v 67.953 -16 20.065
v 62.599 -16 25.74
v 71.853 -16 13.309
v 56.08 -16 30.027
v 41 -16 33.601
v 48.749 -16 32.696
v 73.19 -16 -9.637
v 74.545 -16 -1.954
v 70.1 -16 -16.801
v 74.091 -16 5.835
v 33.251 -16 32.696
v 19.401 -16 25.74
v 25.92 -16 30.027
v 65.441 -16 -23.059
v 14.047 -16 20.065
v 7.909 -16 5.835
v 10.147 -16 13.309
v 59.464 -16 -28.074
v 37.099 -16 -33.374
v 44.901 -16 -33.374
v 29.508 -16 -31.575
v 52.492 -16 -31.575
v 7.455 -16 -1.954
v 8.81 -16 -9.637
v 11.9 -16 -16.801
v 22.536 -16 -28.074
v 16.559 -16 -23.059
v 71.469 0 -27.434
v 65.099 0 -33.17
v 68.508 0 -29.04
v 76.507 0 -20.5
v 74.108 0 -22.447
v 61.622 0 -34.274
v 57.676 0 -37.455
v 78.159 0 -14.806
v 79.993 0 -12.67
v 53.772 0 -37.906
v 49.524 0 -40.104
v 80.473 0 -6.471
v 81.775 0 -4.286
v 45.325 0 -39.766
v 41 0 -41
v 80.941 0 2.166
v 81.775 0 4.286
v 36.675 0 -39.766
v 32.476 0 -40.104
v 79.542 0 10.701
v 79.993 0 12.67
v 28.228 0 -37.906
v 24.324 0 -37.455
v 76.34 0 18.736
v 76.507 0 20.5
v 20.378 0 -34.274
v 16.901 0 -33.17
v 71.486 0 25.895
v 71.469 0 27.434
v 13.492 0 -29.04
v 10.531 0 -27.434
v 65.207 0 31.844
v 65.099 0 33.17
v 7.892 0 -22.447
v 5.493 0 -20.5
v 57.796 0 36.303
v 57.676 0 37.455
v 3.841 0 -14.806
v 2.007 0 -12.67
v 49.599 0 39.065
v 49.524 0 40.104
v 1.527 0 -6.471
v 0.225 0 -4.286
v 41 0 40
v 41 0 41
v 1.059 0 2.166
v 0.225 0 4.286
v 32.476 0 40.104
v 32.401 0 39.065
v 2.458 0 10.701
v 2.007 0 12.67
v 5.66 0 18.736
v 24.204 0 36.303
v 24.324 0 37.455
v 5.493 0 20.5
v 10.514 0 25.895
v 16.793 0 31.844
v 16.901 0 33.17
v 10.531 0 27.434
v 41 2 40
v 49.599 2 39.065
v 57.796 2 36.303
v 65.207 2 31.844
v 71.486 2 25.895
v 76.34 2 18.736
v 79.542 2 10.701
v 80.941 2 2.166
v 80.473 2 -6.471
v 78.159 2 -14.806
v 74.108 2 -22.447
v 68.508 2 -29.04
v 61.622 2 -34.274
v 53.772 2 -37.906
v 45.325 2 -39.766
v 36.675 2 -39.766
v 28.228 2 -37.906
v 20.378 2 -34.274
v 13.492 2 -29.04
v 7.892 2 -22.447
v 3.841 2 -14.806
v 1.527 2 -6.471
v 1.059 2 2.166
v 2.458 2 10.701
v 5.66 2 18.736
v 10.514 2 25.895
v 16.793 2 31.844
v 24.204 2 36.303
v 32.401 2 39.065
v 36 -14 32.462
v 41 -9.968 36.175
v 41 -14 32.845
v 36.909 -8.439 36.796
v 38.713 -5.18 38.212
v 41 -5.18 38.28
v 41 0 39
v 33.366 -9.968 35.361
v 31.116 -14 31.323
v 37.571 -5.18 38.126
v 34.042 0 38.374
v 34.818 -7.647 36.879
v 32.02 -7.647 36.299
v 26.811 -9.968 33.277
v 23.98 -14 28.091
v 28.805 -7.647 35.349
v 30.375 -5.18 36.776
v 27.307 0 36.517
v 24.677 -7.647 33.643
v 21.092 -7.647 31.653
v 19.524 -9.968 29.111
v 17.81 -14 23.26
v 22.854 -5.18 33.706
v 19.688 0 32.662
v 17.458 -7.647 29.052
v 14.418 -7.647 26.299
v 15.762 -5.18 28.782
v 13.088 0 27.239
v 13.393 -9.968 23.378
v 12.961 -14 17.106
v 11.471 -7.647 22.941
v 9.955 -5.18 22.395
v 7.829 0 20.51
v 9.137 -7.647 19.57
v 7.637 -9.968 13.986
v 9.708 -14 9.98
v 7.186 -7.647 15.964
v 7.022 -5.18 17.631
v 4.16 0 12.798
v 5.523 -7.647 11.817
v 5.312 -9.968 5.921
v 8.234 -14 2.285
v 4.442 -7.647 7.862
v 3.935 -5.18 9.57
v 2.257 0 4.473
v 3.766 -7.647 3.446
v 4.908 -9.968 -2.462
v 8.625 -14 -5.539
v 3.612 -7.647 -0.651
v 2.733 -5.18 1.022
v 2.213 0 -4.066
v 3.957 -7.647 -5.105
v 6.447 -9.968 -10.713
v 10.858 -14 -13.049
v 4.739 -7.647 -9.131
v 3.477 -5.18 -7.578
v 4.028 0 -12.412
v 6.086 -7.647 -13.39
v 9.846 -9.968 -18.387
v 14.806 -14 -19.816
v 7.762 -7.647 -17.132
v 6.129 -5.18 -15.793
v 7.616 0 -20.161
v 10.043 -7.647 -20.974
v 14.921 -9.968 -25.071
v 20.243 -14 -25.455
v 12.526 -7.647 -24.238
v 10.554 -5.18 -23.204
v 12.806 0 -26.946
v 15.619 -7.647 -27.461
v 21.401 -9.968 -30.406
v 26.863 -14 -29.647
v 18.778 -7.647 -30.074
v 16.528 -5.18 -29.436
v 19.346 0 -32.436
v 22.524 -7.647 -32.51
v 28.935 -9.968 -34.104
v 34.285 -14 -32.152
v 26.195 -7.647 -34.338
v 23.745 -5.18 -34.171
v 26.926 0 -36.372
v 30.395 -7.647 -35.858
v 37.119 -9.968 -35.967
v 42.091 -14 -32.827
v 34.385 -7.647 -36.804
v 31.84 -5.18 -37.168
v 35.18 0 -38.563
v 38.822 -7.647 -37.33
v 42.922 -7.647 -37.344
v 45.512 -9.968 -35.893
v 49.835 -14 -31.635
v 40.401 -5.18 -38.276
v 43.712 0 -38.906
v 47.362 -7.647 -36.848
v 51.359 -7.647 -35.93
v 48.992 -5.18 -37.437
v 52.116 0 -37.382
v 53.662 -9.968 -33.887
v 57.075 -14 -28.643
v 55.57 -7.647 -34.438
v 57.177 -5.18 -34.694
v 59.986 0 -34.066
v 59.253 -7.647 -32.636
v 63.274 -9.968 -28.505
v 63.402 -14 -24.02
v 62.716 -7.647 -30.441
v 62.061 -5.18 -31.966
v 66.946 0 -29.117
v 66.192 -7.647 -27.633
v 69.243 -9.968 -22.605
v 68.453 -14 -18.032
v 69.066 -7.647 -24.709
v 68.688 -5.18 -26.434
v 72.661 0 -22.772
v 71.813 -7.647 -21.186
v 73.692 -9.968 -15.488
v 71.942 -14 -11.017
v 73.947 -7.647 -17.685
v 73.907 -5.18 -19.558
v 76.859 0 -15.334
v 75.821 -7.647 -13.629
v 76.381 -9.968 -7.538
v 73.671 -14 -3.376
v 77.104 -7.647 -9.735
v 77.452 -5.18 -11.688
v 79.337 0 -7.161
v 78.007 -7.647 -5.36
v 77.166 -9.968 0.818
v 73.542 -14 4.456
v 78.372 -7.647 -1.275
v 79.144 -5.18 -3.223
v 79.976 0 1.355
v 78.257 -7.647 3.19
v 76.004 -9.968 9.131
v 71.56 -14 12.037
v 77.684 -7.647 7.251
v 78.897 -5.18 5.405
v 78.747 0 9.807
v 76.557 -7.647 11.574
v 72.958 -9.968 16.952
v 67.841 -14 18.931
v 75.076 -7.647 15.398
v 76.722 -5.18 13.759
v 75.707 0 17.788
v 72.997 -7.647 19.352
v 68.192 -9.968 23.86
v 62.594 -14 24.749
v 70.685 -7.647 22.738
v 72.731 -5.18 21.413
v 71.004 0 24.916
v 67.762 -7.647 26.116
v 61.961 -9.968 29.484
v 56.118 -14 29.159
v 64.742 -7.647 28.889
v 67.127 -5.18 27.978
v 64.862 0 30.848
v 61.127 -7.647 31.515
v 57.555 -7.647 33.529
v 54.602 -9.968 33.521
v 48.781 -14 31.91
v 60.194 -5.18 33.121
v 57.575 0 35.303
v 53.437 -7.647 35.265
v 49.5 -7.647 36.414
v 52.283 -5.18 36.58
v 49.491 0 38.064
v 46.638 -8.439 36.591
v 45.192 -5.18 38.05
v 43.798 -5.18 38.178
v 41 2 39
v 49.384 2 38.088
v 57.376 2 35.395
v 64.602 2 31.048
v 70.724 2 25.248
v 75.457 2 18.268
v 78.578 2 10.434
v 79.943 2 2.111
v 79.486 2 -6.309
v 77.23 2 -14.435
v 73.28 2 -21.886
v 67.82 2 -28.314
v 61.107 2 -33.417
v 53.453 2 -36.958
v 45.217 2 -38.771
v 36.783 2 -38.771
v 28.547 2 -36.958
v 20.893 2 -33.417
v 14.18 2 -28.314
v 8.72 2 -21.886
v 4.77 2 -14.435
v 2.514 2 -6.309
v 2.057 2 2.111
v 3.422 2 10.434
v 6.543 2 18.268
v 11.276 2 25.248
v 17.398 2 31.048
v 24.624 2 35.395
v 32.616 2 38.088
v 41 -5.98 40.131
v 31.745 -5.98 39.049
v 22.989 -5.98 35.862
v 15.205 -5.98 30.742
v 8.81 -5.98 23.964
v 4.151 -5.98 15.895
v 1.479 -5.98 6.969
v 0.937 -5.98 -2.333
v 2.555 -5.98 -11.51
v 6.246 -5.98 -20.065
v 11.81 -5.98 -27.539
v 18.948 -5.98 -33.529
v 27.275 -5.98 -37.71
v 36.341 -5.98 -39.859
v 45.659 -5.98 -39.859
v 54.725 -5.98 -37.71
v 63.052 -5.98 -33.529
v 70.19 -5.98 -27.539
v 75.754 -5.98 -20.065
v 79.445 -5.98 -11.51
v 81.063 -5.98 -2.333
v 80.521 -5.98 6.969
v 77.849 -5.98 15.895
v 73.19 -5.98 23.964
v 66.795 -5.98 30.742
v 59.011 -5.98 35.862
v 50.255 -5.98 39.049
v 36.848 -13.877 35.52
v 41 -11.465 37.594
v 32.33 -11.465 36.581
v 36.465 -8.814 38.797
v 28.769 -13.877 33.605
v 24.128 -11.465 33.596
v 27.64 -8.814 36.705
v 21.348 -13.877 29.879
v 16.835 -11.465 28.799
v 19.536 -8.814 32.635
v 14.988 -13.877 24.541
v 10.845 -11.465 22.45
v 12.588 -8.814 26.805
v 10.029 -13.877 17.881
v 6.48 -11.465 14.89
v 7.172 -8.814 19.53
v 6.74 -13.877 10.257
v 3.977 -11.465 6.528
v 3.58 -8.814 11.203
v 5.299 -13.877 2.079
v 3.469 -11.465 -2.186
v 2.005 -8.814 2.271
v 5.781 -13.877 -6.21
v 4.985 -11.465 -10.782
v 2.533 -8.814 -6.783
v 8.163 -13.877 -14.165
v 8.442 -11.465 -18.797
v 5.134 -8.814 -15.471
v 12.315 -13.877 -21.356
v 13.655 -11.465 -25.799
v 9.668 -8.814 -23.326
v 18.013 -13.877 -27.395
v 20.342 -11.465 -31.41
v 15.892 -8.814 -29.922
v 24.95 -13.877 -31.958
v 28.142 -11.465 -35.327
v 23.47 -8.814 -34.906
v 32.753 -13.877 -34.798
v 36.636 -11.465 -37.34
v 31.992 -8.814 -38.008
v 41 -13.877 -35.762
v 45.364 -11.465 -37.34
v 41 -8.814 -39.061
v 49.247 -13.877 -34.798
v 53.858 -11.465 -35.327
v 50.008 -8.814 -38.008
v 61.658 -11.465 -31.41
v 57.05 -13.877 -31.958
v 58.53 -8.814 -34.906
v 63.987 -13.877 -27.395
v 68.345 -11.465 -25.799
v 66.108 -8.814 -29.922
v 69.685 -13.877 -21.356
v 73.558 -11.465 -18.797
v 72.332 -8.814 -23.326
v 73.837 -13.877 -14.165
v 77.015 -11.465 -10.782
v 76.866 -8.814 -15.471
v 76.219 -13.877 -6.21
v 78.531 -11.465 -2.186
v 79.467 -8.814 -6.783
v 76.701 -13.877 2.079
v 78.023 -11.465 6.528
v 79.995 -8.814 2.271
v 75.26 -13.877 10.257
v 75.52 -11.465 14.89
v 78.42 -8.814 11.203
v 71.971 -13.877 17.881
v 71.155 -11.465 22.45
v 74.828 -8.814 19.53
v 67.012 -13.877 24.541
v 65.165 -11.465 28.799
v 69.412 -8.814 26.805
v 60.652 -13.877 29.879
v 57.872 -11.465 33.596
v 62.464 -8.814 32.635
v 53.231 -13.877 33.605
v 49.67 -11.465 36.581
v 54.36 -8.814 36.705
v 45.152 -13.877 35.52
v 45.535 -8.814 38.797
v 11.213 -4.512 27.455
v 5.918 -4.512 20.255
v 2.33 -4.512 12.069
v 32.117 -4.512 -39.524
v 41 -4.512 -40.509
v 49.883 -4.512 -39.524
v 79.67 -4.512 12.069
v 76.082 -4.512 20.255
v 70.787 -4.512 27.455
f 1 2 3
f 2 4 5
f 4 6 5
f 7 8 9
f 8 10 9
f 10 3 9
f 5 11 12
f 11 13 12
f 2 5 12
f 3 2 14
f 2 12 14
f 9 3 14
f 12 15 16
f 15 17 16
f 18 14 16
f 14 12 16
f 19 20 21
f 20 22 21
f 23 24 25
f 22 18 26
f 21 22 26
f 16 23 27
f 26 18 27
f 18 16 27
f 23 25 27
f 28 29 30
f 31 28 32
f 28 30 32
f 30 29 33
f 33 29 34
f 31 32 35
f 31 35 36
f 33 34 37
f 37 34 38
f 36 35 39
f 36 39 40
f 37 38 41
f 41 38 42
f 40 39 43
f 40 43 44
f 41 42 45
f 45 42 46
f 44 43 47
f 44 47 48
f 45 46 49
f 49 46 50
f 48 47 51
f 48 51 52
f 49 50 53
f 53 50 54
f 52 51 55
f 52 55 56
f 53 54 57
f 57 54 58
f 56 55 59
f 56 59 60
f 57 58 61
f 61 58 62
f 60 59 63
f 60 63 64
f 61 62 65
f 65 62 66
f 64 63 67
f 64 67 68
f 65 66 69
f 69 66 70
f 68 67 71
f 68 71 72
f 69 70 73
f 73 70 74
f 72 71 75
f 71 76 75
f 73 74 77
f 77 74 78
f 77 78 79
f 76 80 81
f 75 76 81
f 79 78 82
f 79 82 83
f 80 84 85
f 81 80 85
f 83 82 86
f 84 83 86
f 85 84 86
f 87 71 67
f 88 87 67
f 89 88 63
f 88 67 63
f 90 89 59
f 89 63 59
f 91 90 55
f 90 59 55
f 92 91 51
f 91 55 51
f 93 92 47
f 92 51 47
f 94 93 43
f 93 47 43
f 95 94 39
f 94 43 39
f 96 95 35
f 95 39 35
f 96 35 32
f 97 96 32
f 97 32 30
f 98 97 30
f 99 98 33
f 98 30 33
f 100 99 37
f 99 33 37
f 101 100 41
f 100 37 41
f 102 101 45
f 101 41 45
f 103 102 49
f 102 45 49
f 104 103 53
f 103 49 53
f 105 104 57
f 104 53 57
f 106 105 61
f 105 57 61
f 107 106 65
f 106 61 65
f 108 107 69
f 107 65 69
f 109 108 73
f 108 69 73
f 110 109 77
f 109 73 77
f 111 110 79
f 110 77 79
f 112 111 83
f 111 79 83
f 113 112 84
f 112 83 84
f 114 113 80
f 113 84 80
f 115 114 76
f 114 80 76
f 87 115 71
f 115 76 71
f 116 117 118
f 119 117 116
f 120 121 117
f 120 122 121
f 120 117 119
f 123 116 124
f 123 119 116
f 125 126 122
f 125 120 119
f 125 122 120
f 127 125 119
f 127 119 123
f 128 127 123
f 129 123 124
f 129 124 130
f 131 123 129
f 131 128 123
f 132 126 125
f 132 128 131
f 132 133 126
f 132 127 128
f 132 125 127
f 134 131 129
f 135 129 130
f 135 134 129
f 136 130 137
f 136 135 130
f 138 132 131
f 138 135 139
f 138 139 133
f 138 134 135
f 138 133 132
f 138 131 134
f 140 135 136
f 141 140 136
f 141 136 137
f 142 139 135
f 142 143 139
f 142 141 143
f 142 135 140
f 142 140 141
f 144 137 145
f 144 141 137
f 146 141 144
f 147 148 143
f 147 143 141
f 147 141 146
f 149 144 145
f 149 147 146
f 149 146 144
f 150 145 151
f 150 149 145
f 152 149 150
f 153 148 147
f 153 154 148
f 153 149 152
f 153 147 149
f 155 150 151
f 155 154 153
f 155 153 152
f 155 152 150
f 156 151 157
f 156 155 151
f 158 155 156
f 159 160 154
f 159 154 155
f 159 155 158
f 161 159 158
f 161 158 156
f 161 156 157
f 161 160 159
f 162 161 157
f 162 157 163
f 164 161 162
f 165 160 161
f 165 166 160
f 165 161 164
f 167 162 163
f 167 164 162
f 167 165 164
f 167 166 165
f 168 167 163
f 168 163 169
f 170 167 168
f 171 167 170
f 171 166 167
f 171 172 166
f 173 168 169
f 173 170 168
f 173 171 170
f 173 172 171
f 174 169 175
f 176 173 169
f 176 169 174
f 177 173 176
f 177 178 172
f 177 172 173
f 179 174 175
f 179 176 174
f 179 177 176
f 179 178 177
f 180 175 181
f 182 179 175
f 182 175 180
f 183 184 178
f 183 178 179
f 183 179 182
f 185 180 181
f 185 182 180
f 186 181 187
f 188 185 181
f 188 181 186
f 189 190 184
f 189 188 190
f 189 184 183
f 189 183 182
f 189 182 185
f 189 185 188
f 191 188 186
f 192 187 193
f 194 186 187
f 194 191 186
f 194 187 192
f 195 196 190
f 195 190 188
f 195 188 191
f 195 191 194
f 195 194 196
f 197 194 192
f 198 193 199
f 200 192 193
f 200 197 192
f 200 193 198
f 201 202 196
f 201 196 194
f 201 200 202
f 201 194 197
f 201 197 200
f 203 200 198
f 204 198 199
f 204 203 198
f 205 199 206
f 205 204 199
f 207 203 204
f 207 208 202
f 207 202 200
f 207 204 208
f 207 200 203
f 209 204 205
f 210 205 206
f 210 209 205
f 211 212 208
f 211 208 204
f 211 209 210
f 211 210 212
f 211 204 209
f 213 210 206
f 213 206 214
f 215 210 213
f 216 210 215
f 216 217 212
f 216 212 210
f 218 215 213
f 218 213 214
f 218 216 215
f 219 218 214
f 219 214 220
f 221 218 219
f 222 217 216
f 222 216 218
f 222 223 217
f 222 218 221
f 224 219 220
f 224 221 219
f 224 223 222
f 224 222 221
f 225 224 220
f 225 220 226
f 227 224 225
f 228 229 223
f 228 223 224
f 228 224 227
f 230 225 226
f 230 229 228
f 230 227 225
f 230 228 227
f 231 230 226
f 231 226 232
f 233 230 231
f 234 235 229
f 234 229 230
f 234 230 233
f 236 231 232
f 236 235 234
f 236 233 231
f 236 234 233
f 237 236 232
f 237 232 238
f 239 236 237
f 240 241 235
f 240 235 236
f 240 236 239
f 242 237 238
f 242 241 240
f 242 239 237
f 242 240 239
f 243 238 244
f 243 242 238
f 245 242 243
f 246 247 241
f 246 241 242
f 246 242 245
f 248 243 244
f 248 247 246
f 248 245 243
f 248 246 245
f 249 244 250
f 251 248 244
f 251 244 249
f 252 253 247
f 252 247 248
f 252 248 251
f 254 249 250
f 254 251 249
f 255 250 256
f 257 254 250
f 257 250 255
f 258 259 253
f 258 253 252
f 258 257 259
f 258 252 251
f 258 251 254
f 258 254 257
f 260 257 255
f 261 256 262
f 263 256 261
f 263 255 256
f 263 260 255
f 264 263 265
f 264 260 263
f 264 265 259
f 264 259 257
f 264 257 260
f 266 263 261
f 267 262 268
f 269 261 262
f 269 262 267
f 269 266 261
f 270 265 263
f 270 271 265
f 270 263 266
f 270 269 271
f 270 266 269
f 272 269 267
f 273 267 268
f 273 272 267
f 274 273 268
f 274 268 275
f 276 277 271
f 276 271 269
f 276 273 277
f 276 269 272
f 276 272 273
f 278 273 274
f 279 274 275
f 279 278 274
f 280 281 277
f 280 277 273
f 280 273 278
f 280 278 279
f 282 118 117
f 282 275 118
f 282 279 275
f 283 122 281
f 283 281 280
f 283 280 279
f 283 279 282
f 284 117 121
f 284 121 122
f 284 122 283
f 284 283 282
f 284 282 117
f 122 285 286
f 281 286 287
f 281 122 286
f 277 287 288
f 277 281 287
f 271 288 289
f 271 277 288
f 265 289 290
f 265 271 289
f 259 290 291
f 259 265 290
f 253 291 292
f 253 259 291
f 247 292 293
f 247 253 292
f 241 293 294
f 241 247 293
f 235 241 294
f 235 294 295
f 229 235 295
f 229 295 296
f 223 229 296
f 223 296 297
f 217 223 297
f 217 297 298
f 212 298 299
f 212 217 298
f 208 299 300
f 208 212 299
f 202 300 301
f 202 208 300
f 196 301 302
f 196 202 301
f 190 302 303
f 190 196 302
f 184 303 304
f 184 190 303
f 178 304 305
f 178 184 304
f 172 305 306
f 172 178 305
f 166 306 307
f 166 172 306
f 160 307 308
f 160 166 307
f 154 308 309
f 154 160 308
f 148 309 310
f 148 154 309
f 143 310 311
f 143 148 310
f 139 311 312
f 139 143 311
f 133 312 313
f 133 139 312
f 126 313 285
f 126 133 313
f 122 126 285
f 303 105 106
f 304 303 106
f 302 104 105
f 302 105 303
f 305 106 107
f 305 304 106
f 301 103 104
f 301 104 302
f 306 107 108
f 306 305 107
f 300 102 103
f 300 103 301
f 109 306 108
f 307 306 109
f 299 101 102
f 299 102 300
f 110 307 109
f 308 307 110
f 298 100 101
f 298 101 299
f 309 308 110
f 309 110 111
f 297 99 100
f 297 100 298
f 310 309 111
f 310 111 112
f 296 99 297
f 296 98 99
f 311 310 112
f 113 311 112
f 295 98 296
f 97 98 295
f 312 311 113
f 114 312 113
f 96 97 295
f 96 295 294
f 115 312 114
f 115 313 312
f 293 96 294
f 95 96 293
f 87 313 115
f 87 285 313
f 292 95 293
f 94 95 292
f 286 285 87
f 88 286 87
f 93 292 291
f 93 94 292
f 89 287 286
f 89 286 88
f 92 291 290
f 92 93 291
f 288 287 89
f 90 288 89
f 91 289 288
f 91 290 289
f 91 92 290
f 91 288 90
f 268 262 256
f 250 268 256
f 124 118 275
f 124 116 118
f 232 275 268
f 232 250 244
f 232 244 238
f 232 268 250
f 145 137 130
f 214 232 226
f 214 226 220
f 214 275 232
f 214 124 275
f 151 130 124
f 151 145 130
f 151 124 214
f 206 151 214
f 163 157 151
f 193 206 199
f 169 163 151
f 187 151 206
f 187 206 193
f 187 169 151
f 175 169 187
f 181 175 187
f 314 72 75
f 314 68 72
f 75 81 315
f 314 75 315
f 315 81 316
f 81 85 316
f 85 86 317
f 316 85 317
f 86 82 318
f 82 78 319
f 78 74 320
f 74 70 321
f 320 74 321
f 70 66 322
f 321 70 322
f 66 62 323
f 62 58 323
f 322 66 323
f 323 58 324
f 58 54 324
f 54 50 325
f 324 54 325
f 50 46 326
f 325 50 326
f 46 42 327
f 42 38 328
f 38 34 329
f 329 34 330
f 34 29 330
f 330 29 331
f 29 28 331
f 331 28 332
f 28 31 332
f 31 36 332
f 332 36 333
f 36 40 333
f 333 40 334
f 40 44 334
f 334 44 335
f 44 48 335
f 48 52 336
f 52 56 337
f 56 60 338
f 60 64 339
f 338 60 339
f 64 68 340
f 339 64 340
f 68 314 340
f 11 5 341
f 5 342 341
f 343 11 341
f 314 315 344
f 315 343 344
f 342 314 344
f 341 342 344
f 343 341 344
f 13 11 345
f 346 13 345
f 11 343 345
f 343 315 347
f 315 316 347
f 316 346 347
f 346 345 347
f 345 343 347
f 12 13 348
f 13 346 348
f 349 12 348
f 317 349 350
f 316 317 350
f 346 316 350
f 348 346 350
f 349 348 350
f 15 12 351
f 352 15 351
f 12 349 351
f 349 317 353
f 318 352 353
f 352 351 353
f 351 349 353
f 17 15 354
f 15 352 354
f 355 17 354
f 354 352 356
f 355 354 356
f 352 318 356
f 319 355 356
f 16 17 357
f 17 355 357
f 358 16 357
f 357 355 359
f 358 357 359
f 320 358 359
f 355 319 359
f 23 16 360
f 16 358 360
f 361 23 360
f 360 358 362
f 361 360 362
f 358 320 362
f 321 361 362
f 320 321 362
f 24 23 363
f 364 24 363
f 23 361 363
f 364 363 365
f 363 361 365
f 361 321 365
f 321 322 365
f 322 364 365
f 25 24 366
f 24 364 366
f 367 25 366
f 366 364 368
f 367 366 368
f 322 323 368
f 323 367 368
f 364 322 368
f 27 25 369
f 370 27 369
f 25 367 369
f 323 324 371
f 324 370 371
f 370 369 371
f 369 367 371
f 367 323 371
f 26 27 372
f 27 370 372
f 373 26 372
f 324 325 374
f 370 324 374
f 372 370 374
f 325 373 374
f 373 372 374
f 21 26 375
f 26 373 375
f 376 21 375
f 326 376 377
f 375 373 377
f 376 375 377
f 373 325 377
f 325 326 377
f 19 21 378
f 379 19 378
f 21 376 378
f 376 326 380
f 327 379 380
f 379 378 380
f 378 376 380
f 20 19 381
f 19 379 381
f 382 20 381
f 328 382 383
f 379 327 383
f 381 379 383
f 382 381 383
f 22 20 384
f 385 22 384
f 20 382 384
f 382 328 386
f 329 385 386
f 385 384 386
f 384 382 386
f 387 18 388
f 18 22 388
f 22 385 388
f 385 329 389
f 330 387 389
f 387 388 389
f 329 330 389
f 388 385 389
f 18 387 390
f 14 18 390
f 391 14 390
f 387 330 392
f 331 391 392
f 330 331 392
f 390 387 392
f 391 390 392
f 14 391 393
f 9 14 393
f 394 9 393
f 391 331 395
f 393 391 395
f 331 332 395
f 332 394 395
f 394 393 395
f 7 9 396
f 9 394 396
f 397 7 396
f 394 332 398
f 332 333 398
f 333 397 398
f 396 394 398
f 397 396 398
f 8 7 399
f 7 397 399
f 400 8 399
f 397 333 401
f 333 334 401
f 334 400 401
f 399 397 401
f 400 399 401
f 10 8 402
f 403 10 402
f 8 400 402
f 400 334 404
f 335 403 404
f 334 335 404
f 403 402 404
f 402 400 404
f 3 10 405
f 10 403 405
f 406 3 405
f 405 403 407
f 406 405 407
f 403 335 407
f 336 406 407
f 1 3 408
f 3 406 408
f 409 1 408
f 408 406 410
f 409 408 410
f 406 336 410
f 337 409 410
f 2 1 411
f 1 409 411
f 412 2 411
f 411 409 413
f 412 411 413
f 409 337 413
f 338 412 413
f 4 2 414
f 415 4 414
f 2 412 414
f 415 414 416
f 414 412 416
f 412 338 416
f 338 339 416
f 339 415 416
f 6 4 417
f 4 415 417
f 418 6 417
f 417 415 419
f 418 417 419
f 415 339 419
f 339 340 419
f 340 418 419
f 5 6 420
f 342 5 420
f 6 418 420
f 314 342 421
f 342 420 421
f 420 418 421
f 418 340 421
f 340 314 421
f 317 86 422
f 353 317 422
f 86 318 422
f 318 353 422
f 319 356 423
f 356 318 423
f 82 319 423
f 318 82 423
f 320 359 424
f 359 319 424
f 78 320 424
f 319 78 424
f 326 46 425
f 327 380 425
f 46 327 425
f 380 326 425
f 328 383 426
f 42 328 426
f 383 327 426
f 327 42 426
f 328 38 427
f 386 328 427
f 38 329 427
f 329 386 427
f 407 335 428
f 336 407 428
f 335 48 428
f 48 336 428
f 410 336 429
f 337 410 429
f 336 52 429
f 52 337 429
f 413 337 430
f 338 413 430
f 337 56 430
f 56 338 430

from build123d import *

# Parameters (mm, degrees)
SHELL2_T            = -2
SKETCH6_R           = 40
SKETCH6_R_2         = 39
BOSS_EXTRUDE1_DEPTH = 2


with BuildPart() as part:
    # Sketch1 (on Front Plane) → Revolve2 (revolve)
    with BuildSketch(Plane.XY):
        with BuildLine():
            Line((0, 0), (41, 0))
            Line((41, 0), (41, -16))
            Line((41, -16), (7.398529491, -16))
            ThreePointArc((7.398529491, -16), (1.939164752, -8.813884482), (0, 0))
        make_face()
    revolve(axis=Axis((41, 0, 0), (0, -1, 0)))

    # Shell2
    shell2_openings = [part.faces().sort_by_distance(p)[0] for p in [
        (41, 0, 0),
    ]]
    offset(amount=SHELL2_T, openings=shell2_openings, kind=Kind.INTERSECTION)

    # Sketch6 → Boss-Extrude1 (add)
    with BuildSketch(Plane(origin=(0, 0, 0), x_dir=(1, 0, 0), z_dir=(0, 1, 0))):
        with Locations((41, 0)):
            Circle(SKETCH6_R)
        with Locations((41, 0)):
            Circle(SKETCH6_R_2, mode=Mode.SUBTRACT)
    extrude(amount=BOSS_EXTRUDE1_DEPTH)


solid = part.part
